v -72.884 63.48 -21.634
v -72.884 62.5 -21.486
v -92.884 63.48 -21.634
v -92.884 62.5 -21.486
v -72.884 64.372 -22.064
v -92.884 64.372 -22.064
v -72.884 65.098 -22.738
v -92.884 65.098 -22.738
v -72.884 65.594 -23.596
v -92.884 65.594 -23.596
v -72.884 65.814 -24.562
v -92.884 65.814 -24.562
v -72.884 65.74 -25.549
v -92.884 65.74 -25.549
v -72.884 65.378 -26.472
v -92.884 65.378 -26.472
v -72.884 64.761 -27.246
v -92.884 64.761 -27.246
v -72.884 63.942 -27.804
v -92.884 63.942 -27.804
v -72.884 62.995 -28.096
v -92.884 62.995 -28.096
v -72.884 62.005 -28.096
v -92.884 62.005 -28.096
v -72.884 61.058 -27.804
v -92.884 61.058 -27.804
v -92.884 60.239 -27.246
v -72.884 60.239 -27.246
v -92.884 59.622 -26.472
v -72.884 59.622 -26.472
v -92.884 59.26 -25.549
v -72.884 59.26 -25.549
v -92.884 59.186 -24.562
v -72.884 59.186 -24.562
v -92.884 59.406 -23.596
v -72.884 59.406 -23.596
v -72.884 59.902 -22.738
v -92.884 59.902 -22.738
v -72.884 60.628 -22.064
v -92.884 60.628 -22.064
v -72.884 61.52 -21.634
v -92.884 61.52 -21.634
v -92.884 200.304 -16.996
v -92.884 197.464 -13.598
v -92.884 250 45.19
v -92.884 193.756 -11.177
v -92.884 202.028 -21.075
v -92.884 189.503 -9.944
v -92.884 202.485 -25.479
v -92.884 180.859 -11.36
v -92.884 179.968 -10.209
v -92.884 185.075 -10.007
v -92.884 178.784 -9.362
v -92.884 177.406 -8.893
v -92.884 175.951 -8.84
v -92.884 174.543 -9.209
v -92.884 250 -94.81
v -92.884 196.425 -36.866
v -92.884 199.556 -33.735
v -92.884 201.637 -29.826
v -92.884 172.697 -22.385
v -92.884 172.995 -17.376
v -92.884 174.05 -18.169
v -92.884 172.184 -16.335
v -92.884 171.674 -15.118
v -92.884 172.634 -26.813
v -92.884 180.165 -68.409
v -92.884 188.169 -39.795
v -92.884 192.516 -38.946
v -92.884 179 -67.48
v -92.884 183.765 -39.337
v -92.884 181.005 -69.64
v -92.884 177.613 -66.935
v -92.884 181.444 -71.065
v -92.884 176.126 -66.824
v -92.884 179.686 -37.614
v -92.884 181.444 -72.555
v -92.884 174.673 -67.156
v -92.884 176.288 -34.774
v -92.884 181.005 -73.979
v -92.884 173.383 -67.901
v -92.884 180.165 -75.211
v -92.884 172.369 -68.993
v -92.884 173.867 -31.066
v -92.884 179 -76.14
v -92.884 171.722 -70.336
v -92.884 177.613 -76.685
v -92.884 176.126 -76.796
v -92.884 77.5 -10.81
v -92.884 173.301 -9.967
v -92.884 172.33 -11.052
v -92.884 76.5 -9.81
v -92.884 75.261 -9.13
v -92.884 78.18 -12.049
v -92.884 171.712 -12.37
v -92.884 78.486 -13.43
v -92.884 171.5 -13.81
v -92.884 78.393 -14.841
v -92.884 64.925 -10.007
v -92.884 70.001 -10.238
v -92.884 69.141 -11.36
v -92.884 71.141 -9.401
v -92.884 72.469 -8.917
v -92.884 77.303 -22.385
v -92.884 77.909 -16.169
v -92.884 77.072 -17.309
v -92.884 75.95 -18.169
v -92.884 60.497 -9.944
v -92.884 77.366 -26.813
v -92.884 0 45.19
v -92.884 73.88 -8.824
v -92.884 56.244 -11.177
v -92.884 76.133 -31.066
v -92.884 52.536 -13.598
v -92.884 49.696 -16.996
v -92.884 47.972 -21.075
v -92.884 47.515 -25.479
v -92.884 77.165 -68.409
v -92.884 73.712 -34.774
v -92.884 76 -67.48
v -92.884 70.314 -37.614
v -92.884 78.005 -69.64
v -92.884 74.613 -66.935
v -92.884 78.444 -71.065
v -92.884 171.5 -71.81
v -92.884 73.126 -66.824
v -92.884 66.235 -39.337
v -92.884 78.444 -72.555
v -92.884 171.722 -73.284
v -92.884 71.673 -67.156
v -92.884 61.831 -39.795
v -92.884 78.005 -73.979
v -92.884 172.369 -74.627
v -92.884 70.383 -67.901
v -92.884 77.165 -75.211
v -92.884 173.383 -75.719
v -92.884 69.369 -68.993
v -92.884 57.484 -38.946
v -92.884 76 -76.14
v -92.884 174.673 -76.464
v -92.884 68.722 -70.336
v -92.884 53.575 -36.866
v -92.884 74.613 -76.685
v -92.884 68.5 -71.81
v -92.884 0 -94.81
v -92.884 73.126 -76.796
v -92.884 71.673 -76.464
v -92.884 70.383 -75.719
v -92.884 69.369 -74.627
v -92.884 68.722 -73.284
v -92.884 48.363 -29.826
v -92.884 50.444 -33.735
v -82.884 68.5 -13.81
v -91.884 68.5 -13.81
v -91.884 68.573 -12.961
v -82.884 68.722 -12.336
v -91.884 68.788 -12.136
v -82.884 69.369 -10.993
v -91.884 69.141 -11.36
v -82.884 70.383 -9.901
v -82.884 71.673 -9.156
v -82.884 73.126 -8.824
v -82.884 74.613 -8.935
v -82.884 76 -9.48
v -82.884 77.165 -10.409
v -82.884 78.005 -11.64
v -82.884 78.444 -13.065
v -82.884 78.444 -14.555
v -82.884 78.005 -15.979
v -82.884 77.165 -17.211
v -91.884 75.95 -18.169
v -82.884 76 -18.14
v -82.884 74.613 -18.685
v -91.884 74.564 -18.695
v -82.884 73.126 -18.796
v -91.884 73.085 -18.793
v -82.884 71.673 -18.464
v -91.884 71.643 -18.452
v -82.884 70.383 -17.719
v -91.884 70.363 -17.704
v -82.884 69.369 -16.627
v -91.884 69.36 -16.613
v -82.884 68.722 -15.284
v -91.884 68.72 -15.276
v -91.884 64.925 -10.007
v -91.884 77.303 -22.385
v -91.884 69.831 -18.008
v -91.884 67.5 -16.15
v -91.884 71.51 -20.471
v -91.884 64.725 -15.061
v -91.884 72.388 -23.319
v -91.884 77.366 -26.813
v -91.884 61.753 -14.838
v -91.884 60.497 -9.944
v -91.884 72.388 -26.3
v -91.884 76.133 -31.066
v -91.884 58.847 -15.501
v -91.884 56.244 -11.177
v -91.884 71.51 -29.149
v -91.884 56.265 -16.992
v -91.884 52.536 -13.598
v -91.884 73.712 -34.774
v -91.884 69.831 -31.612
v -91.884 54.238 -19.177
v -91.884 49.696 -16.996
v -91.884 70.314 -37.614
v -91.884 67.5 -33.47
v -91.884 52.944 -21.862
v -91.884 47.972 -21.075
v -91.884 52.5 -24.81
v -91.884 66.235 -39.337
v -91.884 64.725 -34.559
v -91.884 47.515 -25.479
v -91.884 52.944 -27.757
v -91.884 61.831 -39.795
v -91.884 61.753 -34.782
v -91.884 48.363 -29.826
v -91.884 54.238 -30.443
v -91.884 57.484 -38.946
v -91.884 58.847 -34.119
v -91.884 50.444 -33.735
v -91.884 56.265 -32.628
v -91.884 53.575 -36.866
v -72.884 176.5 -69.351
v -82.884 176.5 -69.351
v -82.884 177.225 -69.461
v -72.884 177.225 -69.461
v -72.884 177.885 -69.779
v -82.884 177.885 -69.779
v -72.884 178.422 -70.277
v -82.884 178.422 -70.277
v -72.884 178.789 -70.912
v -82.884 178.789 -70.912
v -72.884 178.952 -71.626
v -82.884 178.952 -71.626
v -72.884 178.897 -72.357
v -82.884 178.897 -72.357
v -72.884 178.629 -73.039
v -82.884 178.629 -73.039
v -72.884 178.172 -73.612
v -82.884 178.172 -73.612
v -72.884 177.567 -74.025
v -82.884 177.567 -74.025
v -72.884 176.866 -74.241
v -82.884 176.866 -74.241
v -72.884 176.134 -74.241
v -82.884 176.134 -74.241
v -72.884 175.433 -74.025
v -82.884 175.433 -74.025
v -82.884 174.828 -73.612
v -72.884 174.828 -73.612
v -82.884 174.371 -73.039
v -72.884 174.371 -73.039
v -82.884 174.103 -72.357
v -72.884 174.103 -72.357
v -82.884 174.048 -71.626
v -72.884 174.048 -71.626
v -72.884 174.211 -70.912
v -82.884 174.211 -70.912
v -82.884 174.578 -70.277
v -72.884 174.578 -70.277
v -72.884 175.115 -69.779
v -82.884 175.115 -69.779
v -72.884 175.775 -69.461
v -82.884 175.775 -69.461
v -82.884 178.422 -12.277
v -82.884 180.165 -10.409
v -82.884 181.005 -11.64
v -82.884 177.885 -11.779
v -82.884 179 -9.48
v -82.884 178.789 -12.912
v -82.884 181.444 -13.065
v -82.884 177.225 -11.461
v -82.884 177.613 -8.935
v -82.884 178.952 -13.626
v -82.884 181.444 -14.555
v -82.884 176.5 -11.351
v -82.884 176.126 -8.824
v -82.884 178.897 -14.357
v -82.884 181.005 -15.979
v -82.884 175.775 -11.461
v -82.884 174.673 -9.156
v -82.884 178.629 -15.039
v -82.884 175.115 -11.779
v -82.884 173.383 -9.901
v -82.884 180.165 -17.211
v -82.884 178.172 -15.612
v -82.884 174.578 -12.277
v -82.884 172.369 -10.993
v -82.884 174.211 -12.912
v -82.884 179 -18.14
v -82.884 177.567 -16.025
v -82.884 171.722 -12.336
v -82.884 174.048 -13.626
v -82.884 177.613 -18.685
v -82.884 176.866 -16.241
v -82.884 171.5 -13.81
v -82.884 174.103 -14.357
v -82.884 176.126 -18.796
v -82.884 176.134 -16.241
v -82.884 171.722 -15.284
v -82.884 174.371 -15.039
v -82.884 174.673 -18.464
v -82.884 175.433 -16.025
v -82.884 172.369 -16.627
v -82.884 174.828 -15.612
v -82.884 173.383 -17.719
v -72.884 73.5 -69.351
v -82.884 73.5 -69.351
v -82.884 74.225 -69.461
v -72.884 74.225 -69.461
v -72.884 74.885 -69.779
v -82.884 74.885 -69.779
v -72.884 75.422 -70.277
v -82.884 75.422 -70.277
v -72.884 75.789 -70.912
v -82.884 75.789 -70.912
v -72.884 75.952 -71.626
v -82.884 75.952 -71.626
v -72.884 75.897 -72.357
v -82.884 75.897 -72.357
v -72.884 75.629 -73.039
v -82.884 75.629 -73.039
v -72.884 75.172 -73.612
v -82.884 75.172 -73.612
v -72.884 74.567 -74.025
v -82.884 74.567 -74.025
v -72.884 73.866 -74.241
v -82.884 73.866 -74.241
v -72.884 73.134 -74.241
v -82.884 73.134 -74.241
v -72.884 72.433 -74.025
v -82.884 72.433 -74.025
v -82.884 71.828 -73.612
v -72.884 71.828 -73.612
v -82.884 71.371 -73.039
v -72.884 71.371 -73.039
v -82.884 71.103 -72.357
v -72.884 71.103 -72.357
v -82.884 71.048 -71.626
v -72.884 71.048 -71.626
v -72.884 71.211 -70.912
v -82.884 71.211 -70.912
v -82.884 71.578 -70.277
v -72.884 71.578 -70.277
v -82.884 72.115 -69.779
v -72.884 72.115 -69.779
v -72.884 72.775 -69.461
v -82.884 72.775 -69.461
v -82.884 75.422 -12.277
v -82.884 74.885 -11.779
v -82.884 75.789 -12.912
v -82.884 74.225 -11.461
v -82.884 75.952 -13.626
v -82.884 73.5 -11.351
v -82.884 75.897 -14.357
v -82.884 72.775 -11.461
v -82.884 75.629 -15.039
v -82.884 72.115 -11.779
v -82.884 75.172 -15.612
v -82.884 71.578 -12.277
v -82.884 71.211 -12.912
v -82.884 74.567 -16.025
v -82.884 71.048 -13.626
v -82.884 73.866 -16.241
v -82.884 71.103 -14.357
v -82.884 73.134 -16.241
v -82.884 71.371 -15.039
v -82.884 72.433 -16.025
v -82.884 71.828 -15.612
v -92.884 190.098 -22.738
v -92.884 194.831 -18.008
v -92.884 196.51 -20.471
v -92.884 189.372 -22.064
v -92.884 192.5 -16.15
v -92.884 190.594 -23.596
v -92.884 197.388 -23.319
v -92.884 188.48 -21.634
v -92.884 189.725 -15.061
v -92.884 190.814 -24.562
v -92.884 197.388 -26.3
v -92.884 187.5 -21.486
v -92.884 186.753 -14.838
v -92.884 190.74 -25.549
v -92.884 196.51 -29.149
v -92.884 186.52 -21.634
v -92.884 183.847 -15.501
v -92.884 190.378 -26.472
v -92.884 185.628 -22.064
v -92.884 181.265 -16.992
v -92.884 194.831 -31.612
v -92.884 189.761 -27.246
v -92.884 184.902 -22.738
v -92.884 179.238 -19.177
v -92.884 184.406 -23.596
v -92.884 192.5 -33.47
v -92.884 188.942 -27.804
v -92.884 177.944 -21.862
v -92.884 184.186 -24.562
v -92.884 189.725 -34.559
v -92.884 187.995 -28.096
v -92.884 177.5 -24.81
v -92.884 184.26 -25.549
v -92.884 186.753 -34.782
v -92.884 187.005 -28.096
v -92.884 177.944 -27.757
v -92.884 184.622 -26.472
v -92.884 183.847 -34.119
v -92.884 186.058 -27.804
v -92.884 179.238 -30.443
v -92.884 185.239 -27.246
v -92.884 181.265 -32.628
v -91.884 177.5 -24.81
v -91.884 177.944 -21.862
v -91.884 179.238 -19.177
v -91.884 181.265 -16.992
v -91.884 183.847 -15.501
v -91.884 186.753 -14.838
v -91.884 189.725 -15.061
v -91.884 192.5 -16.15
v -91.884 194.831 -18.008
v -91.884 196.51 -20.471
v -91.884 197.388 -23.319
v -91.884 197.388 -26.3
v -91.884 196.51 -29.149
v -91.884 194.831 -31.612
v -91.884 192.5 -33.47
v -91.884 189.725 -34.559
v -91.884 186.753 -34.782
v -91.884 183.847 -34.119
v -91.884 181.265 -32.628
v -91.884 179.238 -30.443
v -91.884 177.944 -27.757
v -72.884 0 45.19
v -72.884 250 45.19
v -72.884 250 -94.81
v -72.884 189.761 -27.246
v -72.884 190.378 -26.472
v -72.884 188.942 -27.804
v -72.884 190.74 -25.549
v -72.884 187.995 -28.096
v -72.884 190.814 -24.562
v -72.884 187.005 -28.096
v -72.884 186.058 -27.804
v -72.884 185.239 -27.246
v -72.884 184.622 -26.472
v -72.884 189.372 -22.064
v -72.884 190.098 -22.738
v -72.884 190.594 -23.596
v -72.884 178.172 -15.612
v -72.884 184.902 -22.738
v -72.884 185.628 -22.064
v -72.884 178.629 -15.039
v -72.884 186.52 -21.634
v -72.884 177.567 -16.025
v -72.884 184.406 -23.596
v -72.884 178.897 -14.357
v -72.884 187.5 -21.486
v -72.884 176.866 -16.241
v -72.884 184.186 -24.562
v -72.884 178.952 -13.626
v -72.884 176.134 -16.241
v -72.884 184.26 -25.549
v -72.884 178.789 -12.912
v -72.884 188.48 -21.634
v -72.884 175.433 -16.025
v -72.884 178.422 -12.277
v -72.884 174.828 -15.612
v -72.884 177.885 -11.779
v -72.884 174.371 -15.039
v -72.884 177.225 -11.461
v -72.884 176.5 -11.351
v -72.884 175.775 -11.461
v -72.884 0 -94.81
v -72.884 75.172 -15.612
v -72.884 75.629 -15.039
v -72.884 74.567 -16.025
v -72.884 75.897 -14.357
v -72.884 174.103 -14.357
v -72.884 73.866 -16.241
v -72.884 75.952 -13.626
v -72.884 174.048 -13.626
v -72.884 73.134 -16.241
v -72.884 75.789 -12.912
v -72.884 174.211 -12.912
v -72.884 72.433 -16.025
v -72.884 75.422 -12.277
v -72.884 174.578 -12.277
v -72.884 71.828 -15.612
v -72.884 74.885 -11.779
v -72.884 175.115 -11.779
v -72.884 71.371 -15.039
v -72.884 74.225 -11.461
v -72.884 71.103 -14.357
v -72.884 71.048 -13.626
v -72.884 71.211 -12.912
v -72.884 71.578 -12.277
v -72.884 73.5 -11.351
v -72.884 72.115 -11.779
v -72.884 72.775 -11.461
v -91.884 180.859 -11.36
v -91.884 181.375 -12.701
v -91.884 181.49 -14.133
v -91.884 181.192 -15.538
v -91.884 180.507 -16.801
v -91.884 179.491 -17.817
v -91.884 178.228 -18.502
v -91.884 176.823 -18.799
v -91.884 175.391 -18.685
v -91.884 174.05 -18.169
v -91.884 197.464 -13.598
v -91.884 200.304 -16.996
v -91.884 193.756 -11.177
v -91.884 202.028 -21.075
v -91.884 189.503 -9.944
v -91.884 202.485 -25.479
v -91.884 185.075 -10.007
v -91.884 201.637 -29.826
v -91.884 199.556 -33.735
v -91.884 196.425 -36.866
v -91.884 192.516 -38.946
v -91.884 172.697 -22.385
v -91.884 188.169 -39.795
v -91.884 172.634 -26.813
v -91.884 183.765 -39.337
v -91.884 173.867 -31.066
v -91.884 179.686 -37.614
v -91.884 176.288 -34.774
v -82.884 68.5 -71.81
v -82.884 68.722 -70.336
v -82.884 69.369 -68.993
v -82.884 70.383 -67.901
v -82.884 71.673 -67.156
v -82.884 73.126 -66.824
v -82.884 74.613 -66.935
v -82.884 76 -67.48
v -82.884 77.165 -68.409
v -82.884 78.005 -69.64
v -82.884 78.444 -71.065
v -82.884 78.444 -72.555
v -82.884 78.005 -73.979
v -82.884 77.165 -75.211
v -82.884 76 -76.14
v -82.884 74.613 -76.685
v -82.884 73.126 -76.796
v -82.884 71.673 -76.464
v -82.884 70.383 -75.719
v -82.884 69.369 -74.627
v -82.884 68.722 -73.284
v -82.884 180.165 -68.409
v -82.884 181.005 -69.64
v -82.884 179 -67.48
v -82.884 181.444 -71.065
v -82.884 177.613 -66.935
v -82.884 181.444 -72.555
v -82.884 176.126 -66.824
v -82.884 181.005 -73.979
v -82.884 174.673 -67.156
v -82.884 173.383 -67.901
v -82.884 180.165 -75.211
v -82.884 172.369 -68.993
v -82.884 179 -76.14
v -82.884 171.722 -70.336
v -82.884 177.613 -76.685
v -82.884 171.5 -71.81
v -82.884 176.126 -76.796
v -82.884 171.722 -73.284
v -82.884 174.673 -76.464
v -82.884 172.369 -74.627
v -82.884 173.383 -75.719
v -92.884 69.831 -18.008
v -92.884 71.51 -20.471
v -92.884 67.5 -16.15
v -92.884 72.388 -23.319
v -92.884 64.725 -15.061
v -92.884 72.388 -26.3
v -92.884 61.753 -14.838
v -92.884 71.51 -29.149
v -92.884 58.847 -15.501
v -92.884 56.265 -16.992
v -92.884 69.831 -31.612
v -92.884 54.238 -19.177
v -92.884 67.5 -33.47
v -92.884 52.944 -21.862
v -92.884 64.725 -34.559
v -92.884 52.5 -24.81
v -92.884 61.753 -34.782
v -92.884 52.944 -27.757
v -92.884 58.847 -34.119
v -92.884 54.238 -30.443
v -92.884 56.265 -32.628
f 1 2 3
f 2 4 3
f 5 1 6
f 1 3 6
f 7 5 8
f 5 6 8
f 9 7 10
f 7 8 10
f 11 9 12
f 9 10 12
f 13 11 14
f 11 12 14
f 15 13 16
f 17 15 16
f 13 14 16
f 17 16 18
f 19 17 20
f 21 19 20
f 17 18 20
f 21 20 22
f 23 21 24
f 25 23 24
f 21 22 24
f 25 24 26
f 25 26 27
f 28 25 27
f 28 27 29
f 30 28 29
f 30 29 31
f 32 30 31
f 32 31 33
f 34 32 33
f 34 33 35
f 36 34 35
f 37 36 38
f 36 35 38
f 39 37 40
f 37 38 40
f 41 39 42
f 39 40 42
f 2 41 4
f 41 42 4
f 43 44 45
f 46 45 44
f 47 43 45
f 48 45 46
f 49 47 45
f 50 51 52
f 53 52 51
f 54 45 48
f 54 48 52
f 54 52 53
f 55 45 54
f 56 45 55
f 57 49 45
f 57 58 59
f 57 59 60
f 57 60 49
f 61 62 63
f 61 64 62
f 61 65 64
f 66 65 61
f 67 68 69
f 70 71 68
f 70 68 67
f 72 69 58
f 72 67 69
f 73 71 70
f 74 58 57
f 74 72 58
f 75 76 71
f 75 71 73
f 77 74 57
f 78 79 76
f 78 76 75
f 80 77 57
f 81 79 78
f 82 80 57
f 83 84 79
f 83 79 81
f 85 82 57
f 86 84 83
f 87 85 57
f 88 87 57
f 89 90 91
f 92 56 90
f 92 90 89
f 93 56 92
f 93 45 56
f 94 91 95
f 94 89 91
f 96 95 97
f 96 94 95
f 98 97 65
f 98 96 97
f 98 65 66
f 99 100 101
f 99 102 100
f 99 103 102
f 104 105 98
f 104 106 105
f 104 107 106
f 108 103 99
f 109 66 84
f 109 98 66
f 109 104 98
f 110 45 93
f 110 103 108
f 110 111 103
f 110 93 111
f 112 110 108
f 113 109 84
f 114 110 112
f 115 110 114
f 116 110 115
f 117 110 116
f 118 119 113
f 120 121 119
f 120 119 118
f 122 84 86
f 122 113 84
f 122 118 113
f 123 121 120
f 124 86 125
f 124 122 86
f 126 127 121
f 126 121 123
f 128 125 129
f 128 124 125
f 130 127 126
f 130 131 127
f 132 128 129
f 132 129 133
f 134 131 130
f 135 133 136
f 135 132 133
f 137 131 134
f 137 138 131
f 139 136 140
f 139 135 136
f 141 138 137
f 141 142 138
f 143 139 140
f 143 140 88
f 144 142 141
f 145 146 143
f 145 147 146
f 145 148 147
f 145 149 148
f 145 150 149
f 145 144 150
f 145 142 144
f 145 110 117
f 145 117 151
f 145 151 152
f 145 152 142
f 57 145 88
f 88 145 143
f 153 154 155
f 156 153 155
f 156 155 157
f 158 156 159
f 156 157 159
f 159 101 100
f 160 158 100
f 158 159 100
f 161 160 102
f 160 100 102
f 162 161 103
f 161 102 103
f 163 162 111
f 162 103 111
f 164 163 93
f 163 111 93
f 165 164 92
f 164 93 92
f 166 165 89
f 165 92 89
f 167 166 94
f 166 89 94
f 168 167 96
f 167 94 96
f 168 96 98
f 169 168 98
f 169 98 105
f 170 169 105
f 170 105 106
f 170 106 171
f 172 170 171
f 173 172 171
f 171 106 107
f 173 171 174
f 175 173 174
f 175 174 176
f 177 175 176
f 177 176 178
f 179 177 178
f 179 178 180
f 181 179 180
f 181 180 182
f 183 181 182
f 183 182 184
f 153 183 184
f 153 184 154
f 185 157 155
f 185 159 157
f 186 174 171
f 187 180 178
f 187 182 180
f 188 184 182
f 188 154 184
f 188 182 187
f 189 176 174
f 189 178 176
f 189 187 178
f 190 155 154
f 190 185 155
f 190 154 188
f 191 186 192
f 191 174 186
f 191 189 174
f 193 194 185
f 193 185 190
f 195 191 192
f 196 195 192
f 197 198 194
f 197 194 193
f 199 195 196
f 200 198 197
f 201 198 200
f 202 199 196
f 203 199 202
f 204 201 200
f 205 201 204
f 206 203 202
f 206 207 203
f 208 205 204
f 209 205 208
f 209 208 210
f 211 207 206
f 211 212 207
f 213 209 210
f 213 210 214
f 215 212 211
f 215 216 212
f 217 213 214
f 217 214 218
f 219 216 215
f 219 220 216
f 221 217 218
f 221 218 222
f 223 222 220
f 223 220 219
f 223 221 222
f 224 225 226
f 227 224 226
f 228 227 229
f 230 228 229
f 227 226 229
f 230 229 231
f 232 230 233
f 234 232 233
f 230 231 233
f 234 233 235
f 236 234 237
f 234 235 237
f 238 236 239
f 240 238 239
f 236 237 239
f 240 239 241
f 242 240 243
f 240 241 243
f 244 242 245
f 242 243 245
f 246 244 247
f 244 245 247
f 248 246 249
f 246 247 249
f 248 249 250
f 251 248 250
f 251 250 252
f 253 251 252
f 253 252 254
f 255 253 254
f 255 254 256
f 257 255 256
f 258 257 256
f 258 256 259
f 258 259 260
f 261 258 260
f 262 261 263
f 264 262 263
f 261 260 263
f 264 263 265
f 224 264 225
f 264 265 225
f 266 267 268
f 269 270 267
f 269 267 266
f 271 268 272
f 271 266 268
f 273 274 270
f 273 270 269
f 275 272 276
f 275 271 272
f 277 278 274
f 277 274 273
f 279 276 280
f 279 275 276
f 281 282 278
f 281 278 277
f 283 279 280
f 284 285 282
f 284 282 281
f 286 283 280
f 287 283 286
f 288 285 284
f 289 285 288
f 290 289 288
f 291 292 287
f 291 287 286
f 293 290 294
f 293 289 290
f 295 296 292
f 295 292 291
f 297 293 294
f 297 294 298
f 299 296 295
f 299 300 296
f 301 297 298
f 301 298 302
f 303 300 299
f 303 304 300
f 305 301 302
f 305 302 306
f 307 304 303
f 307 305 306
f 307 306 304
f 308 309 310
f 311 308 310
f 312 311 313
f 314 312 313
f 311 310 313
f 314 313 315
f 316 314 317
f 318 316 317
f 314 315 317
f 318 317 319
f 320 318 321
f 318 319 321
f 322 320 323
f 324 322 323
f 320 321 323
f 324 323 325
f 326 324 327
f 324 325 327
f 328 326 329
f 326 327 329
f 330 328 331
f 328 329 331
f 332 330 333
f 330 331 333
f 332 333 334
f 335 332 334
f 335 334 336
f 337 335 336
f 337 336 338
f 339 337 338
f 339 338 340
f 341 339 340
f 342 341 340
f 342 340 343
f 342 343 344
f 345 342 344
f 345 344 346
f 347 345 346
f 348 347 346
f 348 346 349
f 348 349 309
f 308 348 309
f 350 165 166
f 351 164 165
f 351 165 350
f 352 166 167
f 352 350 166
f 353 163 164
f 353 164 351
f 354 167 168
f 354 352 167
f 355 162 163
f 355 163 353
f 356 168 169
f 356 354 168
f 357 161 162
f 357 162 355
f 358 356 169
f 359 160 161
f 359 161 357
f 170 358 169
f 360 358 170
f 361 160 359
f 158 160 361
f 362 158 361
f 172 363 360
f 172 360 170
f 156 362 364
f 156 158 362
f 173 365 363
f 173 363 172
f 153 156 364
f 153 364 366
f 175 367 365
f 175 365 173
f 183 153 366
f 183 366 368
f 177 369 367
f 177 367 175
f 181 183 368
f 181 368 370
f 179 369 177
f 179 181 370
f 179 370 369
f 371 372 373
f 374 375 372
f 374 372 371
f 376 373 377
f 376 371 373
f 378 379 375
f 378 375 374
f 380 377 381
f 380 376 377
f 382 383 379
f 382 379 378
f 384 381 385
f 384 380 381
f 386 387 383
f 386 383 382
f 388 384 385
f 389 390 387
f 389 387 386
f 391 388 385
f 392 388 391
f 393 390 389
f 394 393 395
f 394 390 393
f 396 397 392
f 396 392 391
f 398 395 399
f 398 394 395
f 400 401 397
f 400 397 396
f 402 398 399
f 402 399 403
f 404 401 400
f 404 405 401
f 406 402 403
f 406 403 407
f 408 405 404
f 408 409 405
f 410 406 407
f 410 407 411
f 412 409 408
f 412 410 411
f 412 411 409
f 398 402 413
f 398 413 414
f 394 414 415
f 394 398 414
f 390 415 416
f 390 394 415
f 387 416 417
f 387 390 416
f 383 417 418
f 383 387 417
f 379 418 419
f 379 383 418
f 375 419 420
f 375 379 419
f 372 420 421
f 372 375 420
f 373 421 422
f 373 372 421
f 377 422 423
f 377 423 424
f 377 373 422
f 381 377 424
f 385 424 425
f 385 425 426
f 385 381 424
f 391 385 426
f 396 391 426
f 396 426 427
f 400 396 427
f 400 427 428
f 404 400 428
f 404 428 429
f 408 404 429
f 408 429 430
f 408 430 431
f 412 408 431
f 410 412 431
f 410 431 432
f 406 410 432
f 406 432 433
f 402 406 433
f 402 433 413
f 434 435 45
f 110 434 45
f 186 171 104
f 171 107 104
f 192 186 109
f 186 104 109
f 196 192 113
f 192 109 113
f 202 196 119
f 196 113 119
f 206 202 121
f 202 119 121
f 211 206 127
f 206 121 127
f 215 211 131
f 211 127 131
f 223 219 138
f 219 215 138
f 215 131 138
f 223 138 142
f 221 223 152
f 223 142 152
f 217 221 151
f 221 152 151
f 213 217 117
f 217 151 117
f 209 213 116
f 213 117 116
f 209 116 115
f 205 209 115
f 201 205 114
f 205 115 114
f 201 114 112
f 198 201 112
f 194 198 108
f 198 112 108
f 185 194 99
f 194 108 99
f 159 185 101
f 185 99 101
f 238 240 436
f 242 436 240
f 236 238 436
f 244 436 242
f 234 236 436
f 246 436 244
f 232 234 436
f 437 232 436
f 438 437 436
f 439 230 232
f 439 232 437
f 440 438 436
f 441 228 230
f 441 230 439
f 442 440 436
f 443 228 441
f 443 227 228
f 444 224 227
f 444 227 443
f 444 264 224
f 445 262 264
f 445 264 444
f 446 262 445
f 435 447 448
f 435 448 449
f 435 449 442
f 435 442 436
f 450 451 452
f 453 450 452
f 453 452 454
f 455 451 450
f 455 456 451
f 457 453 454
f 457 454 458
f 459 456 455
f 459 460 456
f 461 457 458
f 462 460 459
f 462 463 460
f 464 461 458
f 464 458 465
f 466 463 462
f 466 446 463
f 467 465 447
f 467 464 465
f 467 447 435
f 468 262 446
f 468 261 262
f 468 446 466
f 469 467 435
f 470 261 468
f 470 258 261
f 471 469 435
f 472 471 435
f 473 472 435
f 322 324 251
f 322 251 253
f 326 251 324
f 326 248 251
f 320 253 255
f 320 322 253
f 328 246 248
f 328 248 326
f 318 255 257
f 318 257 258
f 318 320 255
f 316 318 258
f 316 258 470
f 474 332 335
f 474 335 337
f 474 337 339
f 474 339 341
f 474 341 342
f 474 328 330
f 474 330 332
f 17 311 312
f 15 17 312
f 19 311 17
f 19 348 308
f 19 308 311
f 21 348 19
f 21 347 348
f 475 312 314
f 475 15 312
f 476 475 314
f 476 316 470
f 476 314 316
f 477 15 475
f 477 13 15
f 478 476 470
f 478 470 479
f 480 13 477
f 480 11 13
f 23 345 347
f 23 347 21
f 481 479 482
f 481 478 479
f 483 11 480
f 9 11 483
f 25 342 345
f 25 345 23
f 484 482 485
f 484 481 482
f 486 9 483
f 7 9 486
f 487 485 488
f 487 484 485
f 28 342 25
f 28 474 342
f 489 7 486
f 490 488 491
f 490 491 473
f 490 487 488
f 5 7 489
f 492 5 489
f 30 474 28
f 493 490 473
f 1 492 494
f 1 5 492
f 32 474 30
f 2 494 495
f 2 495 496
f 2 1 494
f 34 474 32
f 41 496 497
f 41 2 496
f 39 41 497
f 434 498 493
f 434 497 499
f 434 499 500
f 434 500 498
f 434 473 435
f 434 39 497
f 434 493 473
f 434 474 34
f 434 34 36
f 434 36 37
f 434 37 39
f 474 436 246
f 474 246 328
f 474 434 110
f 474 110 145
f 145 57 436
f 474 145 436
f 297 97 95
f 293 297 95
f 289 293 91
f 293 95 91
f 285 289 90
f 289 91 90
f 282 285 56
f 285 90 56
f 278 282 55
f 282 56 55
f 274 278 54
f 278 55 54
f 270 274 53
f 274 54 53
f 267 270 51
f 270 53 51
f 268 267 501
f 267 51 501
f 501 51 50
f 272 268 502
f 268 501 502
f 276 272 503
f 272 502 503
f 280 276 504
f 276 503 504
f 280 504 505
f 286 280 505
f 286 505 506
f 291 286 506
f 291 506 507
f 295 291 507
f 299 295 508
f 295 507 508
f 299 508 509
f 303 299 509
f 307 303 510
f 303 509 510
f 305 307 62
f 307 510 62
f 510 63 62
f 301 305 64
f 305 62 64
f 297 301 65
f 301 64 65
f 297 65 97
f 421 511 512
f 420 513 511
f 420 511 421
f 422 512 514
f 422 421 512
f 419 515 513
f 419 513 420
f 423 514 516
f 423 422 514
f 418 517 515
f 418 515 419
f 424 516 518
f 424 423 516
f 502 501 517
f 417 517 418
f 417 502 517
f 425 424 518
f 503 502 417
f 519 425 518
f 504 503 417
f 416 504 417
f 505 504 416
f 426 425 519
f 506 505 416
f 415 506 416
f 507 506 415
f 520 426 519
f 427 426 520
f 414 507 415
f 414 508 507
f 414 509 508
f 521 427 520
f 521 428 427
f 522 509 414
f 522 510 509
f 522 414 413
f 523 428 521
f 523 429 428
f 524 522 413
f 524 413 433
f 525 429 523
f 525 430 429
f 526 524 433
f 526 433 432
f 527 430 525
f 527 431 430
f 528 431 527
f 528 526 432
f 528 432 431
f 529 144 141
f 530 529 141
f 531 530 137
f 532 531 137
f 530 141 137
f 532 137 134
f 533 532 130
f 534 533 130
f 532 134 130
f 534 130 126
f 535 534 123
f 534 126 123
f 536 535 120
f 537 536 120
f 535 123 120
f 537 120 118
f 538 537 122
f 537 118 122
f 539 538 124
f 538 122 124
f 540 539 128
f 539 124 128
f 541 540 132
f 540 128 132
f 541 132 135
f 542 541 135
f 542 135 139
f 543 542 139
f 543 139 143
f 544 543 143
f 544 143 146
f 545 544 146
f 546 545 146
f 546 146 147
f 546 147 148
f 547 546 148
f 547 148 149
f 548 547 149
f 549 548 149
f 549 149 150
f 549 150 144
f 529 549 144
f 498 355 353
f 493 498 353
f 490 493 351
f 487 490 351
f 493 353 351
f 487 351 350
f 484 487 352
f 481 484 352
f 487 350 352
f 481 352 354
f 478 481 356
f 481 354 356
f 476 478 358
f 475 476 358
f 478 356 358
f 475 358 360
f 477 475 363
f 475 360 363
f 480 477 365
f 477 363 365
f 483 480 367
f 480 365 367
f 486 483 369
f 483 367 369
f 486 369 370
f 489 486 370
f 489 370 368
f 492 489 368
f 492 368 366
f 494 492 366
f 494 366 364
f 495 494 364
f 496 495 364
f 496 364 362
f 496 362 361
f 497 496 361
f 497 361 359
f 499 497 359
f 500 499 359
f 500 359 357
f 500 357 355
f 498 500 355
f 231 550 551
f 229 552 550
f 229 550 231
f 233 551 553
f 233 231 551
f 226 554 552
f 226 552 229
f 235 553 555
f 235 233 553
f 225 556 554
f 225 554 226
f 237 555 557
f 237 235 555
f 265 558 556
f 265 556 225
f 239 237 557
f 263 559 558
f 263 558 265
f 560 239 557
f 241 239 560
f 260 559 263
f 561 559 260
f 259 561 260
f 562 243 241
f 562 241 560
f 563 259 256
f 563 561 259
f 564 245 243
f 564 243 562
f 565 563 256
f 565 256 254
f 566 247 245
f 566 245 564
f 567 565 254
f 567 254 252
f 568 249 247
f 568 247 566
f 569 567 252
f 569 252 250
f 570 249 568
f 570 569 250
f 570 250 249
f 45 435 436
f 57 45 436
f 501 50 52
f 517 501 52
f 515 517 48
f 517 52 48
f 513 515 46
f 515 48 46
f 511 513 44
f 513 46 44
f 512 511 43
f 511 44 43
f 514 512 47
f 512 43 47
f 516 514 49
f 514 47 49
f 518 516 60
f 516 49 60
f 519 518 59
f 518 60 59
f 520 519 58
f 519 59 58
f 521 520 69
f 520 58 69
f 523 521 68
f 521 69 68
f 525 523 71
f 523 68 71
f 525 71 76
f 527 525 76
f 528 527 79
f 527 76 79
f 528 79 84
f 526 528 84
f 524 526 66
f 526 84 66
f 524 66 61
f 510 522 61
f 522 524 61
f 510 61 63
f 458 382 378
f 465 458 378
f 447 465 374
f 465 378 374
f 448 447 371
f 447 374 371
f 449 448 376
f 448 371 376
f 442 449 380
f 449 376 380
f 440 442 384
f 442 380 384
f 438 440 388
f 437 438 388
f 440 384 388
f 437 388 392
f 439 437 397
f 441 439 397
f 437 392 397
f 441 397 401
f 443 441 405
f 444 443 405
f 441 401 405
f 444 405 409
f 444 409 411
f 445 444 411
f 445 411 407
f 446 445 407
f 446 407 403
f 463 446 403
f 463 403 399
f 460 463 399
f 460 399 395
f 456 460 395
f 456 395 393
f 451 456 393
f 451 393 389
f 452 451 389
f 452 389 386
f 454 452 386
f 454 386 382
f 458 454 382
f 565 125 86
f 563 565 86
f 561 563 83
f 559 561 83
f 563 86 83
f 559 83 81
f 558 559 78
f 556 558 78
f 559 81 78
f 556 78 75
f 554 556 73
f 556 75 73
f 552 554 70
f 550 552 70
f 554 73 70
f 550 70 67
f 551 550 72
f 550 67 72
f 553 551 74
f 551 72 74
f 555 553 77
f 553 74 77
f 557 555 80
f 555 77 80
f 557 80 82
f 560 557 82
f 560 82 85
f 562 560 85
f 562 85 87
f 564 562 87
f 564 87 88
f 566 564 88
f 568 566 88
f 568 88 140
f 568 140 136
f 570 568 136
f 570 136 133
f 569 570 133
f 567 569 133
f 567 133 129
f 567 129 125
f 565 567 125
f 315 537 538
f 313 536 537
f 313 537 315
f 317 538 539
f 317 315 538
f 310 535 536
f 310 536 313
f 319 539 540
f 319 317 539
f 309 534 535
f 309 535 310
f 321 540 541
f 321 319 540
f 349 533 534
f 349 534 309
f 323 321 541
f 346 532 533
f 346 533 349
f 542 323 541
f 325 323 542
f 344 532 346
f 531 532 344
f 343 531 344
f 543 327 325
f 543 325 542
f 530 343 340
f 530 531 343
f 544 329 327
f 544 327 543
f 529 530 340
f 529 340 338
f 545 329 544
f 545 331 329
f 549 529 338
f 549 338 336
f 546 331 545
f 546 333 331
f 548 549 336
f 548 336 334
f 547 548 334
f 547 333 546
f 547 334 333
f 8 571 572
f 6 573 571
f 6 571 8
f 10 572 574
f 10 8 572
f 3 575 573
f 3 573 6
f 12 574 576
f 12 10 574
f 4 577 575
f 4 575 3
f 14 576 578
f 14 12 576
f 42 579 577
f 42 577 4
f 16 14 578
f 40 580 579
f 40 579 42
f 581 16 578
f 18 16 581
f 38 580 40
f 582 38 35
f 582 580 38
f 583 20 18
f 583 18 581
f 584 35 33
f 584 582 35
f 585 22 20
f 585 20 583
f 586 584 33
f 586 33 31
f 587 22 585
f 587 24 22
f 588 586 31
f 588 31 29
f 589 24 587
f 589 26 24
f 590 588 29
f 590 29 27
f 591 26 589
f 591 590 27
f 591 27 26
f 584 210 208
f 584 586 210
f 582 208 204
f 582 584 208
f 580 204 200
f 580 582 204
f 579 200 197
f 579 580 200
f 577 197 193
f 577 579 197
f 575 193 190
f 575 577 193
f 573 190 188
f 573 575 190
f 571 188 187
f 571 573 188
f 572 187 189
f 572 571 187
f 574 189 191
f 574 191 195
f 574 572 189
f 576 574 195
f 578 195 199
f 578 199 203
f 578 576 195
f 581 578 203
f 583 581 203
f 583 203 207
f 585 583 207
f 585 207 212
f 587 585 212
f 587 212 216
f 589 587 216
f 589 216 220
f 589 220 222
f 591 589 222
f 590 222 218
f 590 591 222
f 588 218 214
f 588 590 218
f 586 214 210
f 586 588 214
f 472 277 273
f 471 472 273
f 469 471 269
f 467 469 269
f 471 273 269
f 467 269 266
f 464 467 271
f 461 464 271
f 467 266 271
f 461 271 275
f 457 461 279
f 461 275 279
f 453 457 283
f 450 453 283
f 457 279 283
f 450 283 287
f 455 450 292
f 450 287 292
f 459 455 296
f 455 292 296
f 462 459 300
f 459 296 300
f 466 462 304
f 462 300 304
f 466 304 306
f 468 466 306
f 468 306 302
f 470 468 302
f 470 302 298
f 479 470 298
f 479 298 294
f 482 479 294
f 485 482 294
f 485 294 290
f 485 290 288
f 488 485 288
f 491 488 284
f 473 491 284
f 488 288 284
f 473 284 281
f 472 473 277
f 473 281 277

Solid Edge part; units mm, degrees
sketch "Sketch1" plane through (0, 0, 0) normal (0, -1, 0) x (1, 0, 0)
  line L0 (-92.8835, -94.8099) -> (-82.8835, -94.8099)
  line L1 (-82.8835, -94.8099) -> (-82.8835, 45.1901)
  line L2 (-82.8835, 45.1901) -> (-92.8835, 45.1901)
  line L3 (-92.8835, 45.1901) -> (-92.8835, -94.8099)
  dimension "D1" = 10
  dimension "D2" = 140
extrude "Protrusion1" add sketch "Sketch1" against normal blind 250
sketch "Sketch2" plane through (-82.8835, 104, 0.1901) normal (1, 0, 0) x (0, -1, 0)
  line L0 (-146, -45) -> (104, -45)
  line L1 (104, -45) -> (104, 95)
  line L2 (104, 95) -> (-146, 95)
  line L3 (-146, 95) -> (-146, -45)
  dimension "D1" = 140
  dimension "D2" = 250
extrude "Protrusion2" add sketch "Sketch2" along normal blind 10
sketch "Sketch3" plane through (-82.8835, 100, 10.1901) normal (1, 0, 0) x (0, -1, 0)
  circle A0 centre (37.5, 35) radius 2.5
  circle A1 centre (-87.5, 35) radius 2.5
  dimension "D1" = 5
  dimension "D2" = 5
  dimension "D3" = 125
  dimension "D4" = 70
  dimension "D5" = 62.5
extrude "Cutout1" cut sketch "Sketch3" against normal through all
extrude "ExtrudedCutout_6" [suppressed]
extrude "Cutout2" [suppressed]
sketch "Sketch4" plane through (-92.8835, 145.5, 0.1901) normal (-1, 0, 0) x (0, -1, 0)
  circle A0 centre (-31, -72) radius 5
  circle A1 centre (72, -72) radius 5
  circle A2 centre (72, -14) radius 5
  circle A3 centre (-31, -14) radius 5
  dimension "D1" = 10
  dimension "D2" = 10
  dimension "D3" = 10
  dimension "D4" = 10
extrude "Cutout3" cut sketch "Sketch4" against normal up to vertex (10 mm away)
sketch "Sketch5" plane through (-92.8835, 104, -4.8099) normal (-1, 0, 0) x (0, -1, 0)
  circle A0 centre (41.5, -20) radius 15
  circle A1 centre (-83.5, -20) radius 10
  circle A2 centre (41.5, -20) radius 10
  circle A3 centre (-83.5, -20) radius 15
  dimension "D1" = 30
  dimension "D2" = 30
  dimension "D3" = 20
  dimension "D4" = 20
extrude "ExtrudedCutout_9" cut sketch "Sketch5" against normal blind 1
hole "Hole1" at (-92.8835, 176.5, -71.8099) direction (1, 0, 0) diameter 4.917 end up to next
hole "Hole2" at (-92.8835, 73.5, -13.8099) direction (1, 0, 0) diameter 4.917 end up to next
hole "Hole3" at (-92.8835, 73.5, -71.8099) direction (1, 0, 0) diameter 4.917 end up to next
hole "Hole4" at (-92.8835, 176.5, -13.8099) direction (1, 0, 0) diameter 4.917 end up to next
hole "Hole_7" at (-92.8835, 187.5, -24.8099) direction (1, 0, 0) diameter 6.647 end up to next
hole "Hole5" at (-92.8835, 62.5, -24.8099) direction (1, 0, 0) diameter 6.647 end up to next
properties material "Aluminum, 6061-T6"
